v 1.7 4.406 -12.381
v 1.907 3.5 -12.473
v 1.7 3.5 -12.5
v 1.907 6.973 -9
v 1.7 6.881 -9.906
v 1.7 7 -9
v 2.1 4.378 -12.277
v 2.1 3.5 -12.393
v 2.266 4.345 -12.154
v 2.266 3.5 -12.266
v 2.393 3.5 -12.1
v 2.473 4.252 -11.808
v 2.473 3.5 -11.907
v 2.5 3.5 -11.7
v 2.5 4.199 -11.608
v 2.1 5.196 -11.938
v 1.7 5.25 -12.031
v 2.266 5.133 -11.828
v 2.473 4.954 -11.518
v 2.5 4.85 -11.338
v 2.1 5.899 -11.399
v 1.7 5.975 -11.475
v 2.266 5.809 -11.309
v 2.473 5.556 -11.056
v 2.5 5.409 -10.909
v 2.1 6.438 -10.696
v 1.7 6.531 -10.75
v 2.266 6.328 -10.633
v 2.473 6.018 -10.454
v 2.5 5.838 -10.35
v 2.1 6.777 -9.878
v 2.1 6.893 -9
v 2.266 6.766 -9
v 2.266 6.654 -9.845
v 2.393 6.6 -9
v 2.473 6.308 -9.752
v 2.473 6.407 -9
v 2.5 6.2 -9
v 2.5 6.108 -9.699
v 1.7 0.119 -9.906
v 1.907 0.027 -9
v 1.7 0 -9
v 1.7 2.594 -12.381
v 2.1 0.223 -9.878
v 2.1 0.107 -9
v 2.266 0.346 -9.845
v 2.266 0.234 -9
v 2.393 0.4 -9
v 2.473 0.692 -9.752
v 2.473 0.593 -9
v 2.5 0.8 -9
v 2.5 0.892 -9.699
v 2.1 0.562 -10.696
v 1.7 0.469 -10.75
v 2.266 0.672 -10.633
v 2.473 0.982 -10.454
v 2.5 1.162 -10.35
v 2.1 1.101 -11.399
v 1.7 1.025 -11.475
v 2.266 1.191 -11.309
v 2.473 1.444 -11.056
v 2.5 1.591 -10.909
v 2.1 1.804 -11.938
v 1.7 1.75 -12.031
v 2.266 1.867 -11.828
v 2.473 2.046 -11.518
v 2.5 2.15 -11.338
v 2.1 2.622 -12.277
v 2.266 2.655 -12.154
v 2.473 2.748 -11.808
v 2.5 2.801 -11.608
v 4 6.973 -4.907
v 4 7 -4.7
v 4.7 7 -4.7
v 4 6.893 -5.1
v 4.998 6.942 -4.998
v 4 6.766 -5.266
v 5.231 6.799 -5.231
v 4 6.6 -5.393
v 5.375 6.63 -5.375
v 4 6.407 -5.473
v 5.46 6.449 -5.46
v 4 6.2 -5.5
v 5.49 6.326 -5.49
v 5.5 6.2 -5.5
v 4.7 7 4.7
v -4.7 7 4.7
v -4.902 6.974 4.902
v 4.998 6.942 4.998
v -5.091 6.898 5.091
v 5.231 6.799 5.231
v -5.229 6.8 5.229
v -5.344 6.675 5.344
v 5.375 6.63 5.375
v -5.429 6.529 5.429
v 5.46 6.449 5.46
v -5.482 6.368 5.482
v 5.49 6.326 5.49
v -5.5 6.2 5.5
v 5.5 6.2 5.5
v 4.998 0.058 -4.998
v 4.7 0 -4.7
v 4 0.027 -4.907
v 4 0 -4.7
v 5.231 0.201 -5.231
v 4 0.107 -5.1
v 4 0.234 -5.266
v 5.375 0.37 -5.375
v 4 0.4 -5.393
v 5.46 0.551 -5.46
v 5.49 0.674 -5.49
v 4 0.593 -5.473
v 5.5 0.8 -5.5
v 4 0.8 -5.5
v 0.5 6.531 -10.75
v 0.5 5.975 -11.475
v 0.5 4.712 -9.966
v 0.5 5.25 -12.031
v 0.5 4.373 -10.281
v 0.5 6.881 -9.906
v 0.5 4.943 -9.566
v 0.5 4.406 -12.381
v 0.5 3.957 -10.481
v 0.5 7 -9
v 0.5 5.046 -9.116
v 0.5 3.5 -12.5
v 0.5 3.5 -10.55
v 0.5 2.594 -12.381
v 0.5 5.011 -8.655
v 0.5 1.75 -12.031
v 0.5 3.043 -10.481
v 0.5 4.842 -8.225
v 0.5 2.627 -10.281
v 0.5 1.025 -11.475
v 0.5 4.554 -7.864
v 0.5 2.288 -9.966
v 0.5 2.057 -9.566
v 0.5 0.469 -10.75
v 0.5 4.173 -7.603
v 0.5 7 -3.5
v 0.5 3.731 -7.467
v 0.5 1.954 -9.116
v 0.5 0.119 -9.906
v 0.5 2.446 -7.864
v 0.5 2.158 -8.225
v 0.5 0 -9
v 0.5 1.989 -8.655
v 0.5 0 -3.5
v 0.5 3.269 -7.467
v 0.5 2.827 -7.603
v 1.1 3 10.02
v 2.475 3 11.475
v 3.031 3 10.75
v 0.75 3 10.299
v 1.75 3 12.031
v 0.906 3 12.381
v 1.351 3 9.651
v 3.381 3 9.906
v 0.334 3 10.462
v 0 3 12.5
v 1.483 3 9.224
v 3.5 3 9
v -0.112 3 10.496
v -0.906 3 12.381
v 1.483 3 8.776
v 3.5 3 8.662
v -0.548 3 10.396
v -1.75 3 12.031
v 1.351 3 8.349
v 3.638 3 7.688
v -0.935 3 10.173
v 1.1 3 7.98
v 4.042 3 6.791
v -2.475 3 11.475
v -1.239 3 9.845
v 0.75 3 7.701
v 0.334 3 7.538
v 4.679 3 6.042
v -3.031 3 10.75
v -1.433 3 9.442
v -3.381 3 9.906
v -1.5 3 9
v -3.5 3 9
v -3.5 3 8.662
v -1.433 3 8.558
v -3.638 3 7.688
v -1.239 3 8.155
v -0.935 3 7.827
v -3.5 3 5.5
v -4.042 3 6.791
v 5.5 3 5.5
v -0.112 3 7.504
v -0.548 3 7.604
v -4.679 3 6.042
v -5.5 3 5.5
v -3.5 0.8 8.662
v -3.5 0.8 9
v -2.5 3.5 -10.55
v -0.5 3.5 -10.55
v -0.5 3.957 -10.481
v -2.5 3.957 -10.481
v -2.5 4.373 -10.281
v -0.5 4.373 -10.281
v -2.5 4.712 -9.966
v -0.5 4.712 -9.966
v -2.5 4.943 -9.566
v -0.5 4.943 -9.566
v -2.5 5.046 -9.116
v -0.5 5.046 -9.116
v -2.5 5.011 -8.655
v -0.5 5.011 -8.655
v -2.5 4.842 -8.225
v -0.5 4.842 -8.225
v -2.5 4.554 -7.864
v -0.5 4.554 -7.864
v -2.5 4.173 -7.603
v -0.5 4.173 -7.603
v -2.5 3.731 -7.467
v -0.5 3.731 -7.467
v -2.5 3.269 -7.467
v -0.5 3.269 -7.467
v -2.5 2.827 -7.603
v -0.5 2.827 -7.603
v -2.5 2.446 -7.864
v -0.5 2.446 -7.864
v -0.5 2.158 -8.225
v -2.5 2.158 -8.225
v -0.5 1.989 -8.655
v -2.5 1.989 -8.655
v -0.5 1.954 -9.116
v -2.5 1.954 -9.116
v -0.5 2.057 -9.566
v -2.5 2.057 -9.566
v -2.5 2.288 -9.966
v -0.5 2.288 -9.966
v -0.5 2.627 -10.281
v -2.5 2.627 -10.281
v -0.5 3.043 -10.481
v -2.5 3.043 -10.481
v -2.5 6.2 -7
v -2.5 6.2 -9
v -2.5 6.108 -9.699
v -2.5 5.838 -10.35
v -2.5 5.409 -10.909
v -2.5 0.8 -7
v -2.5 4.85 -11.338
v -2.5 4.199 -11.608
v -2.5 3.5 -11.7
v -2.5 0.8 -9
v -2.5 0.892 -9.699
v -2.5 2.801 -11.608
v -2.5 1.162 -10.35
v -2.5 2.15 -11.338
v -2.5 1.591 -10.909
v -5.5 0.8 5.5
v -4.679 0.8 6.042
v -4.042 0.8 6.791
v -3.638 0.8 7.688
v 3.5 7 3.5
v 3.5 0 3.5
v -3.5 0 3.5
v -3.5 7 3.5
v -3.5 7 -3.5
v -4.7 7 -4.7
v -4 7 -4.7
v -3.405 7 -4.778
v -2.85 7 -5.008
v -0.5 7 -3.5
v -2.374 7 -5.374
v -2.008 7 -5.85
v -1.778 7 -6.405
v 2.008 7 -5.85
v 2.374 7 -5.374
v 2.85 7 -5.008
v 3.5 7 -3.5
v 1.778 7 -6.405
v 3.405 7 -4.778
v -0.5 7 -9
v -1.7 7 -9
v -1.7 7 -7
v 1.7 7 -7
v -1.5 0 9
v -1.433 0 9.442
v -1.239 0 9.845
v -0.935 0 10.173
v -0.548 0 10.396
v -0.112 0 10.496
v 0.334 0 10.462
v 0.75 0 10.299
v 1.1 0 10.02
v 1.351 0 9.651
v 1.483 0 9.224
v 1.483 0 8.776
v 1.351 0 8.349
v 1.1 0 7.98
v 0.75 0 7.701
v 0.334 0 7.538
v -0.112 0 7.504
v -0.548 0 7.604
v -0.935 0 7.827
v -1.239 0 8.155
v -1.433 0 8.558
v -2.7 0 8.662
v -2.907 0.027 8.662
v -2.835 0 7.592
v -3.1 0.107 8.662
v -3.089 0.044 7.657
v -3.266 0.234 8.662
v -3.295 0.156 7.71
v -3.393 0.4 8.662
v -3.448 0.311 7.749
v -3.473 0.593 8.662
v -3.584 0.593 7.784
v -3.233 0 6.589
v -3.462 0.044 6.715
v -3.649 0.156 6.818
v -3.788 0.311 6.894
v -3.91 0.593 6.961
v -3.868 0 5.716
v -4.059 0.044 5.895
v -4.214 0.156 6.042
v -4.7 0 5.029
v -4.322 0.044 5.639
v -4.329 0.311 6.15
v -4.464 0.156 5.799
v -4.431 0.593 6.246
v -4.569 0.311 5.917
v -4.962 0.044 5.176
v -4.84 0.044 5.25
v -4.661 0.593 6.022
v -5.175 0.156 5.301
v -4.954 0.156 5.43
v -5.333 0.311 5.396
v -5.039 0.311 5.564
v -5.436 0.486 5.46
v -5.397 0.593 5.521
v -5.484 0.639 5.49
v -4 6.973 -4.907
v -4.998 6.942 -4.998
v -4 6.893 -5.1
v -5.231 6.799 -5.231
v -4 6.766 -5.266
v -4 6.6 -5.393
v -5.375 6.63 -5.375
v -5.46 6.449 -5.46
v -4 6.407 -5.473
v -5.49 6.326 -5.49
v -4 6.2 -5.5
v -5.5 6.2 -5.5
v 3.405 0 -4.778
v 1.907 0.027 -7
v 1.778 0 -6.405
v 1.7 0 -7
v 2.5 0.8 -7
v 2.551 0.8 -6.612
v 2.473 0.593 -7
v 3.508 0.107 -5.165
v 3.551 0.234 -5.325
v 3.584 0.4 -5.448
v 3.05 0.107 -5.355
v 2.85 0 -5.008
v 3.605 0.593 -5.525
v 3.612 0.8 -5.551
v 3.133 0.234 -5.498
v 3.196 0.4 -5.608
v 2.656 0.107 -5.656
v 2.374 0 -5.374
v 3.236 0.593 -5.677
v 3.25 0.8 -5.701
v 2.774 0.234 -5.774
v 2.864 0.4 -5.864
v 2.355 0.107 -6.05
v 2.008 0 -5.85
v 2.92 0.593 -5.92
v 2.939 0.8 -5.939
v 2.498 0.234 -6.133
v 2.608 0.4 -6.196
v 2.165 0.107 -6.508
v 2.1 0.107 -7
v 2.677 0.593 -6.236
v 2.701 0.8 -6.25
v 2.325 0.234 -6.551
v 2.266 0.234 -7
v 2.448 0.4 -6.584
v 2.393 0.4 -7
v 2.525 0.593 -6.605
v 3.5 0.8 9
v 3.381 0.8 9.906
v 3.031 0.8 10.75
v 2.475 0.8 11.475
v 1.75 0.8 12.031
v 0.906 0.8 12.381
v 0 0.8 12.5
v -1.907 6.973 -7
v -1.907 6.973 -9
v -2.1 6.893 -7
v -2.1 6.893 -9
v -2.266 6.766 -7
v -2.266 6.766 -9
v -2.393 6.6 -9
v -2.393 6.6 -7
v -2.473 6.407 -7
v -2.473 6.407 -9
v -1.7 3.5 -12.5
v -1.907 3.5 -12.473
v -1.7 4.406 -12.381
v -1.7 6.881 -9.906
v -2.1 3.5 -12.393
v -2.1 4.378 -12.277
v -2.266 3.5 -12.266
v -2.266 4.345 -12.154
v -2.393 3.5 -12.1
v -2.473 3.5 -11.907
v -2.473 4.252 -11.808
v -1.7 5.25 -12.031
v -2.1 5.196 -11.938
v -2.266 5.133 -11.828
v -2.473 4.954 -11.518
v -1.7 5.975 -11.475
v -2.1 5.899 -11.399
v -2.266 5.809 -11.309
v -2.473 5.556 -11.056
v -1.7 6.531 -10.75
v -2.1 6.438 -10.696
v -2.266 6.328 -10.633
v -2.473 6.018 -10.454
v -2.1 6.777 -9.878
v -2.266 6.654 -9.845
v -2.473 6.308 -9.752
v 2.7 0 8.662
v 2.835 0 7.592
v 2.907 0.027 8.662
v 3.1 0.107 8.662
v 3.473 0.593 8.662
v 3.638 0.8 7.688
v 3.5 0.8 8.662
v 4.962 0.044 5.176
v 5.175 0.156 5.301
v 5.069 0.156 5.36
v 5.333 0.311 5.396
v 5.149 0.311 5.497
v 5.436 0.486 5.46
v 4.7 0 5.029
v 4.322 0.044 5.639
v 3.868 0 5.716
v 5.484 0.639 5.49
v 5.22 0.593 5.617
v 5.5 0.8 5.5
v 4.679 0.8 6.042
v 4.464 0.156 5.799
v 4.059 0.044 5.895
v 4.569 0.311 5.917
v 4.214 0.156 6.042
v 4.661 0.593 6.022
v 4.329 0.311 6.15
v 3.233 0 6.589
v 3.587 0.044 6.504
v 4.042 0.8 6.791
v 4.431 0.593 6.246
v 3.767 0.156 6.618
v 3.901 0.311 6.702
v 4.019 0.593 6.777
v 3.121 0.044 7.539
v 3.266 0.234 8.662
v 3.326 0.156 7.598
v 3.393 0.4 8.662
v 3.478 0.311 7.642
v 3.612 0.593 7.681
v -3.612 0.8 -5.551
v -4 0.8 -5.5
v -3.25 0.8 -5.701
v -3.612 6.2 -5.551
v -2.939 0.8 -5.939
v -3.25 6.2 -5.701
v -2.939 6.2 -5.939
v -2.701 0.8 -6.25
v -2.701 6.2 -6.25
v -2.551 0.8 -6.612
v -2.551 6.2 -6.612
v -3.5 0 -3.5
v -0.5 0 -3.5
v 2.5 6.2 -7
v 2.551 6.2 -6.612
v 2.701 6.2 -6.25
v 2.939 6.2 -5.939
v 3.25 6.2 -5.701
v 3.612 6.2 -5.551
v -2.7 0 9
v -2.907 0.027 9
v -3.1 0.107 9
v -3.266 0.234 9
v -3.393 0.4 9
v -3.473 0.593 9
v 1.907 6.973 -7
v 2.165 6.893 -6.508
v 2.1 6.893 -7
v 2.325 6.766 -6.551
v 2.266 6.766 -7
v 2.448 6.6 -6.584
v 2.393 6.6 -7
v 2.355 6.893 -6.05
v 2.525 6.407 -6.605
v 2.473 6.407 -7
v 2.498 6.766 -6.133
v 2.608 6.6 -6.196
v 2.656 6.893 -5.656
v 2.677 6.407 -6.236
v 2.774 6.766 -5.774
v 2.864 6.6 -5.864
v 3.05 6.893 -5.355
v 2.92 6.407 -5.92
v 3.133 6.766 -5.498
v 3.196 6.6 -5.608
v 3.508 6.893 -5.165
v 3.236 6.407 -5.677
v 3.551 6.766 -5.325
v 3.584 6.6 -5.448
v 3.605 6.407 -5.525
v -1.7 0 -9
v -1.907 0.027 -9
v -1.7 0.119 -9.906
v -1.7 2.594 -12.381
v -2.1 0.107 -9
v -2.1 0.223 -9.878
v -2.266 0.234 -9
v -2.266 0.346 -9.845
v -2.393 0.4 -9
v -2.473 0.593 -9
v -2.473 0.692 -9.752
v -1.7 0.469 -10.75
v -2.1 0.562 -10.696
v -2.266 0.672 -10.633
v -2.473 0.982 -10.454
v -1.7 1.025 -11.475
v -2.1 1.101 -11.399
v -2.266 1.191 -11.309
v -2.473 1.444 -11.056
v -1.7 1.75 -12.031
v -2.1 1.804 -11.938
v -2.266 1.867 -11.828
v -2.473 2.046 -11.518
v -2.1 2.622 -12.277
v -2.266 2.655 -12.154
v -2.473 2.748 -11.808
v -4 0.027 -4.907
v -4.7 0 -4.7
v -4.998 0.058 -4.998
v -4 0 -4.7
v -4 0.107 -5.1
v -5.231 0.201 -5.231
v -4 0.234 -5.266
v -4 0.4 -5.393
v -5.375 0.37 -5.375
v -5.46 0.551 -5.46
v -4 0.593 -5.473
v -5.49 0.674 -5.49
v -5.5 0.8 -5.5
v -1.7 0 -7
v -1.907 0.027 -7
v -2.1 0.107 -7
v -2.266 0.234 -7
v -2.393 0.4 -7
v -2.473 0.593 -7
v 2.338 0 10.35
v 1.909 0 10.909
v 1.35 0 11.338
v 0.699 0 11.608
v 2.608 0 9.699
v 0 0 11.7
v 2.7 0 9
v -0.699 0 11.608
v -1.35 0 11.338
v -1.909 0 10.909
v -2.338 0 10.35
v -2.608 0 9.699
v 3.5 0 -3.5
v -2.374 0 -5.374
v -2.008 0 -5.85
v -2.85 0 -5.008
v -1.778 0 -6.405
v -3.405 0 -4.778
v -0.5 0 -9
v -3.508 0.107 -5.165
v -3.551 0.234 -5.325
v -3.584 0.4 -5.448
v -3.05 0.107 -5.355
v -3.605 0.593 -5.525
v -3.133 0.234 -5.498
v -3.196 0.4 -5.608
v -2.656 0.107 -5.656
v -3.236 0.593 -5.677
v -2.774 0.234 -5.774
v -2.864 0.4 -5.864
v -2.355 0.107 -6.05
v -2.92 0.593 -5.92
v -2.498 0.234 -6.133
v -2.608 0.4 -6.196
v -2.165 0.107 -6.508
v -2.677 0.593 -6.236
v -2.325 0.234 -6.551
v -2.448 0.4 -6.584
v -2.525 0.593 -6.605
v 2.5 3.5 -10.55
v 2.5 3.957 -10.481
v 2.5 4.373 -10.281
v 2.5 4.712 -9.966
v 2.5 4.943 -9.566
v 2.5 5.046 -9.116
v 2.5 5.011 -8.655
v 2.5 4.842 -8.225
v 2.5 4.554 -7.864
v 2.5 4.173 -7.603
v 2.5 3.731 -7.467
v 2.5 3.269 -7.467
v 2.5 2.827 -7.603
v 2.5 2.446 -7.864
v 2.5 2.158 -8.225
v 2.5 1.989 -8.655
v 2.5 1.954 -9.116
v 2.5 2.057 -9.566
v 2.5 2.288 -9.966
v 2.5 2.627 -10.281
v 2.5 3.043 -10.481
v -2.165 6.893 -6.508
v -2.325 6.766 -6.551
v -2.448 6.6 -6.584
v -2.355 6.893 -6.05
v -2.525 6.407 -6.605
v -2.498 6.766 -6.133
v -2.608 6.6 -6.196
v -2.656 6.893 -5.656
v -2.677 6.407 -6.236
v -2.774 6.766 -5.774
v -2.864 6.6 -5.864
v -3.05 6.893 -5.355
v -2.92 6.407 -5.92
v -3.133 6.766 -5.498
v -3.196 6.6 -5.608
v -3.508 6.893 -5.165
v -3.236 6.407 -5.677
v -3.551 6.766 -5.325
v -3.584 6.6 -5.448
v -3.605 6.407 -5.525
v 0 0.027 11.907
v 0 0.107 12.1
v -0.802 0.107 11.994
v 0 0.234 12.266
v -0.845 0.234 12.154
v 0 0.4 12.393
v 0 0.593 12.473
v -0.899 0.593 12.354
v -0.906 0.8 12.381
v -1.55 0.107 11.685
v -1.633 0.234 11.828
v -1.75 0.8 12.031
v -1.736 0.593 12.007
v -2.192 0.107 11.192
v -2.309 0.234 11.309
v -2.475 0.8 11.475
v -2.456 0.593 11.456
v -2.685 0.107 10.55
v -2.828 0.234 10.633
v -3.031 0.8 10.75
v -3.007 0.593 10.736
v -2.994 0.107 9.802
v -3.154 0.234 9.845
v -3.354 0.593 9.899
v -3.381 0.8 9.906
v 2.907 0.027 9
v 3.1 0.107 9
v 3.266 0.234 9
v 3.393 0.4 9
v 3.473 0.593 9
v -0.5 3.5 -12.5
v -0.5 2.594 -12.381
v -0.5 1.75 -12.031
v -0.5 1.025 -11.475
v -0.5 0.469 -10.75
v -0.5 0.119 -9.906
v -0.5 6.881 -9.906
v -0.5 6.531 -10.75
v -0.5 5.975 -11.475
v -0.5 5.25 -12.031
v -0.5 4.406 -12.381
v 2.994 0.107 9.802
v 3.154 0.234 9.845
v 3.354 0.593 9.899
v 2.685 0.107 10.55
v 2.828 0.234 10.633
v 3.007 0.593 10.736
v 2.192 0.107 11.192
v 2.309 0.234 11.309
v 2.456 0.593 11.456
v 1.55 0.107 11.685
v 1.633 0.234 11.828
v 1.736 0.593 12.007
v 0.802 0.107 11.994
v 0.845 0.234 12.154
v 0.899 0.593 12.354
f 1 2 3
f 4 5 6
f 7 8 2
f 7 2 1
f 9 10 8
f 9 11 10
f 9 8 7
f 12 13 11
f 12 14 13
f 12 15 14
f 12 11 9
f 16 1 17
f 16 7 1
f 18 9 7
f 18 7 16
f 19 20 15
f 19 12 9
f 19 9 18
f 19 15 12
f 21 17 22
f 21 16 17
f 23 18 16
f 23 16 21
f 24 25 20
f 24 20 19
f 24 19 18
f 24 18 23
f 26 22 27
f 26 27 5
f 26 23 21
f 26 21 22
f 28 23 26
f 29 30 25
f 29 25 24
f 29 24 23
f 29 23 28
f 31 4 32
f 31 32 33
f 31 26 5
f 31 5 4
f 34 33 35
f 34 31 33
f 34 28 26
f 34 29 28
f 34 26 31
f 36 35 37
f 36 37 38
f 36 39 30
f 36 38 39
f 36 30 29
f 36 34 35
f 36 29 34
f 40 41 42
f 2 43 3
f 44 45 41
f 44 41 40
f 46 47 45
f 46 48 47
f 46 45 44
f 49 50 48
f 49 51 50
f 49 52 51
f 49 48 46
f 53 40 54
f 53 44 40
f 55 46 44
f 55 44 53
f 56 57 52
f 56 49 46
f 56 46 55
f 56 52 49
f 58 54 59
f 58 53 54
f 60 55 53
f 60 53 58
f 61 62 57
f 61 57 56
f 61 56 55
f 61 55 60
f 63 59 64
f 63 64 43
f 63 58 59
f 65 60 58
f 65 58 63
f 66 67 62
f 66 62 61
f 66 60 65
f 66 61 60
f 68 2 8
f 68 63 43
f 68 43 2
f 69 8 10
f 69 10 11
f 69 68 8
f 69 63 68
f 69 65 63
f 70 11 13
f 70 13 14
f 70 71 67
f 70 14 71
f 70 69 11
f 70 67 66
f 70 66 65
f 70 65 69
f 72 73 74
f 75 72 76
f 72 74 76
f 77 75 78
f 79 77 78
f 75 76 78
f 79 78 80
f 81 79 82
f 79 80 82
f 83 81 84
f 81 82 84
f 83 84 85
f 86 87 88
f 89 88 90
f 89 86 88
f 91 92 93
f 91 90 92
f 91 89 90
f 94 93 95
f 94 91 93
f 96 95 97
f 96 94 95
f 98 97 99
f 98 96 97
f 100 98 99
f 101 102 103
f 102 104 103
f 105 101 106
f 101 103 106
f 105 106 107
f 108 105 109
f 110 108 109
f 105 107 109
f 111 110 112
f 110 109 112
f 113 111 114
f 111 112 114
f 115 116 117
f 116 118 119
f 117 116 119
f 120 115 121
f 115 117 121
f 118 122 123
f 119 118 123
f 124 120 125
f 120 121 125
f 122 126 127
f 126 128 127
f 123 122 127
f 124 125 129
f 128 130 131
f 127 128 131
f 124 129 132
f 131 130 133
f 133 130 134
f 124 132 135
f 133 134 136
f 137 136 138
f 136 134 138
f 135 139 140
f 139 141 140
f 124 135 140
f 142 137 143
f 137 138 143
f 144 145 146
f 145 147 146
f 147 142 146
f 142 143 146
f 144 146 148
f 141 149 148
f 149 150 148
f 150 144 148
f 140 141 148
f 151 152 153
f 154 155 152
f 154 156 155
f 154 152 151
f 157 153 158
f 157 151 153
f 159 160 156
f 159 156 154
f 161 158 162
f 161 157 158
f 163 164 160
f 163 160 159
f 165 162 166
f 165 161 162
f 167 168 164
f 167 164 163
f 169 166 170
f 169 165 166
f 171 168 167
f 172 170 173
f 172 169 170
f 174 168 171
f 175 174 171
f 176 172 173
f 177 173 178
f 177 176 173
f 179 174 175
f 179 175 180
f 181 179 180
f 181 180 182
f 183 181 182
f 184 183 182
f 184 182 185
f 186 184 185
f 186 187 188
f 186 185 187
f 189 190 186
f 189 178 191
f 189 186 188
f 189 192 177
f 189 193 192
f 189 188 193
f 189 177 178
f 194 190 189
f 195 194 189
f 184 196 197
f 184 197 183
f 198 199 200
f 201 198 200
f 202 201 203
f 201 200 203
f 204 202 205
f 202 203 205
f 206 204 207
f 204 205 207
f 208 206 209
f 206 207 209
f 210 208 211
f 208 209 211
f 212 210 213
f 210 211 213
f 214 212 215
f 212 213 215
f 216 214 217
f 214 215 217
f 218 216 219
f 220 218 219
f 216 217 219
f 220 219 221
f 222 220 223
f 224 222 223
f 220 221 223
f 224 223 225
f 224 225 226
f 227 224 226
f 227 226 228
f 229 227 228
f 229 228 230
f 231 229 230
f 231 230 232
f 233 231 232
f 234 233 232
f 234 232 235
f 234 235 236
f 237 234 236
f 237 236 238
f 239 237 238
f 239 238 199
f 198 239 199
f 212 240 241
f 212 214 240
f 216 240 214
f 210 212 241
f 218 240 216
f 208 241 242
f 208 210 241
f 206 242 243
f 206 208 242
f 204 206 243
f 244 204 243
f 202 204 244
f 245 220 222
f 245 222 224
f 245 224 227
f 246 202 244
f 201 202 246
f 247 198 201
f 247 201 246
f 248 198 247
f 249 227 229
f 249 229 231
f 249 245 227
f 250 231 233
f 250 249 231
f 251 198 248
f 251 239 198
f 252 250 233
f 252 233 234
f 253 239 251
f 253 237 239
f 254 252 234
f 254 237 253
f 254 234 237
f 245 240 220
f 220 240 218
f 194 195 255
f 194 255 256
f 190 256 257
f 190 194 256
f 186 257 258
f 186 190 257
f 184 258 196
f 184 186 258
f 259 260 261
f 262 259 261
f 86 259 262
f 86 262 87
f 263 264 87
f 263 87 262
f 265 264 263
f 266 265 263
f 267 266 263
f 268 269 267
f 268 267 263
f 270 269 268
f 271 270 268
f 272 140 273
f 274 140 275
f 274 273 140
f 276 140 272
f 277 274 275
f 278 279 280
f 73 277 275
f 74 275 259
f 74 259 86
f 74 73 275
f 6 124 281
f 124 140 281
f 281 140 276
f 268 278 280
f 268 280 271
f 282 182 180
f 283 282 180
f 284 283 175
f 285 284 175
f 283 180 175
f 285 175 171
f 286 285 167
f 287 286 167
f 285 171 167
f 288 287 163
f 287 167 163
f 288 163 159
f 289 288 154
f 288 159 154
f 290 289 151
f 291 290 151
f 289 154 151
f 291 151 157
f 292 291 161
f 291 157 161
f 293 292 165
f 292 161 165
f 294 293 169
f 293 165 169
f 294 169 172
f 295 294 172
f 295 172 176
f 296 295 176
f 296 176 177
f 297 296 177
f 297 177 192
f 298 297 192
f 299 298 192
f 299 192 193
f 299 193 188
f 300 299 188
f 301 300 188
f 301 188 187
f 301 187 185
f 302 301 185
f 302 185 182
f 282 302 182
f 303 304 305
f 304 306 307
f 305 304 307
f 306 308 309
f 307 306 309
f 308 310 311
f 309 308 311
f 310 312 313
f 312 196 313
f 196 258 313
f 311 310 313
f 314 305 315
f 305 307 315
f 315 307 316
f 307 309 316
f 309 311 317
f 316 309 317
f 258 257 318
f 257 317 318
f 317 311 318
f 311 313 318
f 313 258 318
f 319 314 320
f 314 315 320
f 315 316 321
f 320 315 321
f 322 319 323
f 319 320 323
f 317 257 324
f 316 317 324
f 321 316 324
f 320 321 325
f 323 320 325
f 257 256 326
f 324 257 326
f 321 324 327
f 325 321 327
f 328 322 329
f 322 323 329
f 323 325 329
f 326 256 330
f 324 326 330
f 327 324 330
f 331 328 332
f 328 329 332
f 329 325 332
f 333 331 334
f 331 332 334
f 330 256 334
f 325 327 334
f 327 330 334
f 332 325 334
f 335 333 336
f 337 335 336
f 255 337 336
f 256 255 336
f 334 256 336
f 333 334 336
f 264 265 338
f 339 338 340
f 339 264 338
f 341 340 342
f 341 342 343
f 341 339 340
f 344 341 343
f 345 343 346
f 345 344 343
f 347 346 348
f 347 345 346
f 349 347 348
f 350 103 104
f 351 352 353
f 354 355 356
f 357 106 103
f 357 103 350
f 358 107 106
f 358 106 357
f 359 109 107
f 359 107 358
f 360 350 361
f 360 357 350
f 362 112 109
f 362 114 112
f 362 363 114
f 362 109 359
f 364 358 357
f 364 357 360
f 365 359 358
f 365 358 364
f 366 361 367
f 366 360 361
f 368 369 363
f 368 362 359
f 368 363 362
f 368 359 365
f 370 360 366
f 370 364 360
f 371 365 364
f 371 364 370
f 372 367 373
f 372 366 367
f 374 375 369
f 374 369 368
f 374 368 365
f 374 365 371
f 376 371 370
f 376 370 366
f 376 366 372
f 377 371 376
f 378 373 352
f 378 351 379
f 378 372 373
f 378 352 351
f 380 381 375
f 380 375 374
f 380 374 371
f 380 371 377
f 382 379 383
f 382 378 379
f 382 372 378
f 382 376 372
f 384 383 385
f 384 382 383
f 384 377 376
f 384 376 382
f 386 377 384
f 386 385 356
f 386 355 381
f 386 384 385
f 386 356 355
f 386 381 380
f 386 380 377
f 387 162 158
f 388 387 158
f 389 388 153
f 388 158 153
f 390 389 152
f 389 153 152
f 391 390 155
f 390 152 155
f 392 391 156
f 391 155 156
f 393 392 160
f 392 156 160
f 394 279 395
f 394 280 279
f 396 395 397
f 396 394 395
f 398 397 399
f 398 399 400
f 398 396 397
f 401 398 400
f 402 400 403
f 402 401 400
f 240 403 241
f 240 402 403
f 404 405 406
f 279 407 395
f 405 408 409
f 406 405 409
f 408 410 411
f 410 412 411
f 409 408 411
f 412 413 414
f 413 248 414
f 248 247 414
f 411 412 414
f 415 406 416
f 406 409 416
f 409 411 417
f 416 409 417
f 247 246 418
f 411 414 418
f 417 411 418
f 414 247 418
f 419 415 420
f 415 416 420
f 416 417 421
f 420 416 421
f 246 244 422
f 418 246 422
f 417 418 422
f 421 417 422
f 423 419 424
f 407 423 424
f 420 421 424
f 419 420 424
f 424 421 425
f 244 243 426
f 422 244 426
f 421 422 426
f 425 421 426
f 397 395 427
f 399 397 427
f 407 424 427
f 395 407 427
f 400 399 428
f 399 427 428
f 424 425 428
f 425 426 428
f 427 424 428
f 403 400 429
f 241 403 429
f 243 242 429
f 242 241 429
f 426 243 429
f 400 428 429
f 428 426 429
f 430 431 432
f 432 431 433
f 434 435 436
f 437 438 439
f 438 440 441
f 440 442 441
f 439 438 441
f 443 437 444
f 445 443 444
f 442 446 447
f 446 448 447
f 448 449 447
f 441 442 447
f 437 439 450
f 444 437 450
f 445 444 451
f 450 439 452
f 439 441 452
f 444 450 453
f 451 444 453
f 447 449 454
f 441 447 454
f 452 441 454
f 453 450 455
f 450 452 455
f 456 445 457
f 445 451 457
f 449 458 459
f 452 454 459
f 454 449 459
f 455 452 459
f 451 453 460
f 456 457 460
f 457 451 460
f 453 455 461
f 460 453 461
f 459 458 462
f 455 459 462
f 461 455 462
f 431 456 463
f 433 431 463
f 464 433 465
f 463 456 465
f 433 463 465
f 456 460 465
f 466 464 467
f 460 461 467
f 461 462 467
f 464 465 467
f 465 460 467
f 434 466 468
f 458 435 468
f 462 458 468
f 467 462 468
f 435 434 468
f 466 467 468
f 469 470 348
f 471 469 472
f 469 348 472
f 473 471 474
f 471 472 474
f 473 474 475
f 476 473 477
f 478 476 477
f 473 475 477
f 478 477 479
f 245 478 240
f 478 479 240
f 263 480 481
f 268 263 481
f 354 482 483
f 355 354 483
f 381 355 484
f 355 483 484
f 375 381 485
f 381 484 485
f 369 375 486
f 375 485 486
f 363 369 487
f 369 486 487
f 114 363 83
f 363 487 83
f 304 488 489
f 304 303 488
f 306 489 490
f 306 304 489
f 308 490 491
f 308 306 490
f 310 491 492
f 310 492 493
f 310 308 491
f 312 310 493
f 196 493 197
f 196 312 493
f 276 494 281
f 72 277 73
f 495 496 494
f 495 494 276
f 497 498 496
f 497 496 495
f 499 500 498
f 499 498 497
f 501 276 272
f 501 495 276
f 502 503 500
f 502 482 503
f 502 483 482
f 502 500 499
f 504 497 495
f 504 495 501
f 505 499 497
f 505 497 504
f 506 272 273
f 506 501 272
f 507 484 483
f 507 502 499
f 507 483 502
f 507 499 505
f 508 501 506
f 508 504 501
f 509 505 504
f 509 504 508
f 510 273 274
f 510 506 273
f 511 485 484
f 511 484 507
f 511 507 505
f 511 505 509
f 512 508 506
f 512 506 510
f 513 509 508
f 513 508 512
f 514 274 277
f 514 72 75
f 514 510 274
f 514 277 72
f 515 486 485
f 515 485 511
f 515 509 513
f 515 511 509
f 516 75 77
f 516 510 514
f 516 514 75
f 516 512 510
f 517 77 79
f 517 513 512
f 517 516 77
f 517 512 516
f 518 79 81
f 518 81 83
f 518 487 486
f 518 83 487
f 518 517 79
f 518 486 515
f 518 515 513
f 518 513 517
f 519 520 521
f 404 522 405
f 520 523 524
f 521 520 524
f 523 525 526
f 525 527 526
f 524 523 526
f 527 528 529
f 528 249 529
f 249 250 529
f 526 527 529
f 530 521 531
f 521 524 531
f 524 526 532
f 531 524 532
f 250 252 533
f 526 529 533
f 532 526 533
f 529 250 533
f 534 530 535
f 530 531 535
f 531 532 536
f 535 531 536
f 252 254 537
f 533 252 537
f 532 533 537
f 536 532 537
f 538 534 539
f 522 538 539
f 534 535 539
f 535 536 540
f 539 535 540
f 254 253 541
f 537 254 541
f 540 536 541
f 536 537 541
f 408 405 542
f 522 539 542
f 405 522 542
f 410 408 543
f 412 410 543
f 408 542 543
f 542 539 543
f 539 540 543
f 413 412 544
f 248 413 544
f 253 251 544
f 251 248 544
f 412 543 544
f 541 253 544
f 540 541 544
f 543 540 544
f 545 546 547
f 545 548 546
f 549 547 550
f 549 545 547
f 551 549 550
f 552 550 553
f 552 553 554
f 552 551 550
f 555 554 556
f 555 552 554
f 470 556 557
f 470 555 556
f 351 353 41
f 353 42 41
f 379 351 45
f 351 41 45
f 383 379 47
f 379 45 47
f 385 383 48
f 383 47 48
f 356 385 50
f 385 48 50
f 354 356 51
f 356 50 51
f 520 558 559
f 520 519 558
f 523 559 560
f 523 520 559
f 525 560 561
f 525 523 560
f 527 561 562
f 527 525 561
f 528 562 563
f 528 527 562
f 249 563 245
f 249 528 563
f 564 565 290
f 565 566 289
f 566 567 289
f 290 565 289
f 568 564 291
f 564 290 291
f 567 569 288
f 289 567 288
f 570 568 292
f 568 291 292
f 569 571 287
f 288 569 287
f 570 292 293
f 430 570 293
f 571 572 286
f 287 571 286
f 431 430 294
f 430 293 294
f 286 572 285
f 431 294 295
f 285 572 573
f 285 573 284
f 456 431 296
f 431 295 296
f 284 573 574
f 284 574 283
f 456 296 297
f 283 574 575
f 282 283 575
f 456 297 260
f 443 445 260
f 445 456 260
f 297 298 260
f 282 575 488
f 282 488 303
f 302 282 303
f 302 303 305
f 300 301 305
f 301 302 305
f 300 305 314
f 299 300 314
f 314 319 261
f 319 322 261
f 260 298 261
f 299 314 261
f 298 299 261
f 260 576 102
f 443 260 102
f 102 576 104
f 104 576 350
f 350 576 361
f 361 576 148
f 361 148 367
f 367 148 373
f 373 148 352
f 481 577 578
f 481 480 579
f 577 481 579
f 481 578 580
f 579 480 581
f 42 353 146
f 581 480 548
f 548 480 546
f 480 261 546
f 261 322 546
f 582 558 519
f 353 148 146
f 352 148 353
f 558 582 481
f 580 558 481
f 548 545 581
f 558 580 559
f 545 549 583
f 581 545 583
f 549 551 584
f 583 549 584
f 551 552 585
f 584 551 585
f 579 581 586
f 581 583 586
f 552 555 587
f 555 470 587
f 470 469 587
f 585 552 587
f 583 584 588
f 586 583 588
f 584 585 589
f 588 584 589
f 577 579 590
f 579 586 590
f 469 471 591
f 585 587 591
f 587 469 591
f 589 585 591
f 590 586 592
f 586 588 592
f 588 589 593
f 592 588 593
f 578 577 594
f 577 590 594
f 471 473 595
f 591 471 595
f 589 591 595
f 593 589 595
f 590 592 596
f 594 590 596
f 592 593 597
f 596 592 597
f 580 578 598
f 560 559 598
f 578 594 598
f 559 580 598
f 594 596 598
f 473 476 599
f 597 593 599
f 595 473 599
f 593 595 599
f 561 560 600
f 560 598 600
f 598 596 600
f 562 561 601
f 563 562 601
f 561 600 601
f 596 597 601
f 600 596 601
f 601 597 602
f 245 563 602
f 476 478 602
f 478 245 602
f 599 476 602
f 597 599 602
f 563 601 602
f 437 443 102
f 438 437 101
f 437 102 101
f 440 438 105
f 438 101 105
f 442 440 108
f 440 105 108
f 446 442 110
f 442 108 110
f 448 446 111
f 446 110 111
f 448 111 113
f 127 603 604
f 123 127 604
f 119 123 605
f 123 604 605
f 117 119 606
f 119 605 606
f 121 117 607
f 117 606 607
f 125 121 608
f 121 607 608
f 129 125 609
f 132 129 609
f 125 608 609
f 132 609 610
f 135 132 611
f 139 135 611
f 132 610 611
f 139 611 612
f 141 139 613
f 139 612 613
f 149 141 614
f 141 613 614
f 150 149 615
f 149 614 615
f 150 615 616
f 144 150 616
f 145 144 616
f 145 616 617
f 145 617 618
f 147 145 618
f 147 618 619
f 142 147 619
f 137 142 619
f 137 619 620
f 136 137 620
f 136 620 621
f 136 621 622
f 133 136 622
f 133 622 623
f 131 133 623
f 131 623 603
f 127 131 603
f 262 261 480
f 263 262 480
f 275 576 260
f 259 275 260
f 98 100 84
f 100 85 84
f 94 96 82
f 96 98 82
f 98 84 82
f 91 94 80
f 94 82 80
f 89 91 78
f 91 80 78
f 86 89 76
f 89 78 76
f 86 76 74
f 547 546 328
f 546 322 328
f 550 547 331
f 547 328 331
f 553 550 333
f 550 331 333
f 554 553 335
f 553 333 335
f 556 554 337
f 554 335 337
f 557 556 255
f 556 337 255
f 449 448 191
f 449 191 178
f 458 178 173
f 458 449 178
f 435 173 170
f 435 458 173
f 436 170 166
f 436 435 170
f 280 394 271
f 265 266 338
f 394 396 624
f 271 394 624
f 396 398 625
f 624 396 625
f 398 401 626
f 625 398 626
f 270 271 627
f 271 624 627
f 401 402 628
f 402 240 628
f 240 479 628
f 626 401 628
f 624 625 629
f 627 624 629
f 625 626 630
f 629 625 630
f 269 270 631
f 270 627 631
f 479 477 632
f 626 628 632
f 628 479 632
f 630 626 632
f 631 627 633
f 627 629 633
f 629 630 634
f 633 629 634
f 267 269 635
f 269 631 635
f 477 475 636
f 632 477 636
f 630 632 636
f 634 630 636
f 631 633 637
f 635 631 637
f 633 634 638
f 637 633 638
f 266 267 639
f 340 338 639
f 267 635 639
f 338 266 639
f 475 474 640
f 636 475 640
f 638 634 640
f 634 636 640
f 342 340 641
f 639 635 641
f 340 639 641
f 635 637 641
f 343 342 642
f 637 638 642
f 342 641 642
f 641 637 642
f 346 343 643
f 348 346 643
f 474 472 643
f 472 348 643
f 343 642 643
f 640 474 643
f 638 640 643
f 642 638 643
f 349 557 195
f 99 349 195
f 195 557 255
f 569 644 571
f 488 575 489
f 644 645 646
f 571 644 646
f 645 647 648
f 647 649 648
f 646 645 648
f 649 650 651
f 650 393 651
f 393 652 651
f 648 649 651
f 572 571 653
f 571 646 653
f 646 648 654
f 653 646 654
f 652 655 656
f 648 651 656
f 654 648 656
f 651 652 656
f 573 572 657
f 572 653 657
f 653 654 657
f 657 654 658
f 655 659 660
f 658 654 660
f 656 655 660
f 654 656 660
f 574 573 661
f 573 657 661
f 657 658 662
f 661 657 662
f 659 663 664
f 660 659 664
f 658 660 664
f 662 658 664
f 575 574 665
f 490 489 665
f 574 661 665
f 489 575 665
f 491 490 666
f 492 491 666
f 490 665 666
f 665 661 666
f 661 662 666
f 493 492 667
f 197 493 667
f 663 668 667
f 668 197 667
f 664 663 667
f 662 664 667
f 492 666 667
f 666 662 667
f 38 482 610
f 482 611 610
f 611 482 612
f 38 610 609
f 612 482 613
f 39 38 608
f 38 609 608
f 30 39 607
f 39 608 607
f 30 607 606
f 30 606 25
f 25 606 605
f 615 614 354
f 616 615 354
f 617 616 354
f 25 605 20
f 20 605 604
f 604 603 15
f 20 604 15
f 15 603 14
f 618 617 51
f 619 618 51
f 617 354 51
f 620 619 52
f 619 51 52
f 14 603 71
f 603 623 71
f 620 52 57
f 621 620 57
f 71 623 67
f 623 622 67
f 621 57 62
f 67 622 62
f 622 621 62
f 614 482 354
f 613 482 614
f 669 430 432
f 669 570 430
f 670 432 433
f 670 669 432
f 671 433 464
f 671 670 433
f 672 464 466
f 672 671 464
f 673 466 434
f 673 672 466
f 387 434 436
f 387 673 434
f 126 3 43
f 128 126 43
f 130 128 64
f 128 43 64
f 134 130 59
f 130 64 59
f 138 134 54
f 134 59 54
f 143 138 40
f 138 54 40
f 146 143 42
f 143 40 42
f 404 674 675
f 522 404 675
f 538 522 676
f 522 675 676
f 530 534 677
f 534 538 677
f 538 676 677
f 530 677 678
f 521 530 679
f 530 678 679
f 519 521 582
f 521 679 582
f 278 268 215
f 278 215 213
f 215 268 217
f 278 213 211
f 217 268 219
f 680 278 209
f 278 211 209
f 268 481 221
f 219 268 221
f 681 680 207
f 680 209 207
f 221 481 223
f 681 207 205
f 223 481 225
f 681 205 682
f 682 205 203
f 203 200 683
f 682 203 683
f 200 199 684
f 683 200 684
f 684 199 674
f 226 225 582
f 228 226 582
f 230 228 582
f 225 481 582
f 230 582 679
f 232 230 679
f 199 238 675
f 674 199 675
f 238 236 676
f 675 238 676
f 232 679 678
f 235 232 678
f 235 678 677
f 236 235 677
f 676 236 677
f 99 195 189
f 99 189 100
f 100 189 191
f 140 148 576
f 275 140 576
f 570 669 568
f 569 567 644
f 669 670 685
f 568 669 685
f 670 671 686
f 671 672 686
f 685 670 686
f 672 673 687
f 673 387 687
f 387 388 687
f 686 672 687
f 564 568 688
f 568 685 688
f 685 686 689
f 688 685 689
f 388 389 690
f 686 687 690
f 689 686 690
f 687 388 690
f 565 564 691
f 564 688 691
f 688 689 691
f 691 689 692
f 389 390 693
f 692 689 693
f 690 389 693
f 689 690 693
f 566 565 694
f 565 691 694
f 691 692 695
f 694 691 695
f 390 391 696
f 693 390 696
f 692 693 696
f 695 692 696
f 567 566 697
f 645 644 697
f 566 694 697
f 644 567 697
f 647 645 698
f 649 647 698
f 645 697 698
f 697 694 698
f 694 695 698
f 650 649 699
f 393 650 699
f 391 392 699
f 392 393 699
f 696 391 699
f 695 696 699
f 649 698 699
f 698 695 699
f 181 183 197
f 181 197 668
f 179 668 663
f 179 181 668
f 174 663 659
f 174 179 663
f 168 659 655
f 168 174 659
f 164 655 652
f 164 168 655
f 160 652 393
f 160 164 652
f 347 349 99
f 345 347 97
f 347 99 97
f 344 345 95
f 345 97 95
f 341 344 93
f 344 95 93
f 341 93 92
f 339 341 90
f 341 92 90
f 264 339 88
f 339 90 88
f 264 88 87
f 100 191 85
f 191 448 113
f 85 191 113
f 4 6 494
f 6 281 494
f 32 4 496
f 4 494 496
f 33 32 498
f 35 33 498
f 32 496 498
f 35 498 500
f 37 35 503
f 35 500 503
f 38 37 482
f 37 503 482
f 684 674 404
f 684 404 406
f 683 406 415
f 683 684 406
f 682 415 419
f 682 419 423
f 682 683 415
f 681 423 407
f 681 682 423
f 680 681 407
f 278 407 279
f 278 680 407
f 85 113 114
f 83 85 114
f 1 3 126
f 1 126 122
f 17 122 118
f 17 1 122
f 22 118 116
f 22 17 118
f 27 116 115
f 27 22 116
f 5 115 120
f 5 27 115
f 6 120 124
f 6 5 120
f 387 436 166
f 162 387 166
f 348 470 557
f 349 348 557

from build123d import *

# Parameters (mm, degrees)
SKETCH_1_W          = 2
SKETCH_1_H          = 7
EXTRUDE_2_DEPTH     = 7
FILLET_1_R          = 3.5
SKETCH_2_R          = 1.55
CUT_EXTRUDE_1_DEPTH = 17.408839081
SKETCH_3_W          = 3.5
SKETCH_3_H          = 3
EXTRUDE_4_DEPTH     = 7
FILLET_2_R          = 3.5
SKETCH_4_R          = 1.5
CUT_EXTRUDE_2_DEPTH = 15.230249471
FILLET_3_R          = 3.5
FILLET_4_R          = 1.5
FILLET_5_R          = 0.8


# Some blends are built 0.0001 mm under size
with BuildPart() as part:
    # 草图1 → 凸台-拉伸2 (new body)
    with BuildSketch(Plane(origin=(0, 0, 0), x_dir=(1, 0, 0), z_dir=(0, 1, 0))):
        Polygon((-3.5, -3.5), (-3.5, 3.5), (-0.5, 3.5), (-0.5, 5.5), (-2.5, 5.5), (-5.5, 5.5), (-5.5, -5.5), (5.5, -5.5), (5.5, 5.5), (2.5, 5.5), (0.5, 5.5), (0.5, 3.5), (3.5, 3.5), (3.5, -3.5), align=None)
        with Locations((-1.5, 9)):
            Rectangle(SKETCH_1_W, SKETCH_1_H)
        with Locations((1.5, 9)):
            Rectangle(SKETCH_1_W, SKETCH_1_H)
    extrude(amount=EXTRUDE_2_DEPTH)

    # 圆角1
    fillet_1_edges = [part.edges().sort_by_distance(p)[0] for p in [
        (1.5, 7, -12.5),
        (1.5, 0, -12.5),
        (-1.5, 0, -12.5),
        (-1.5, 7, -12.5),
    ]]
    fillet(fillet_1_edges, radius=FILLET_1_R - 0.0001)  # a hair under: the kernel refuses the full size

    # 草图2 → 切除-拉伸1 (cut, through all)
    with BuildSketch(Plane(origin=(2.5, 0, 0), x_dir=(0, 0, -1), z_dir=(1, 0, 0))):
        with Locations((9, 3.5)):
            Circle(SKETCH_2_R)
    extrude(amount=-CUT_EXTRUDE_1_DEPTH, mode=Mode.SUBTRACT)

    # 草图3 → 凸台-拉伸4 (add)
    with BuildSketch(Plane.XY.offset(5.5)):
        with Locations((-1.75, 1.5)):
            Rectangle(SKETCH_3_W, SKETCH_3_H)
        with Locations((1.75, 1.5)):
            Rectangle(SKETCH_3_W, SKETCH_3_H)
    extrude(amount=EXTRUDE_4_DEPTH)

    # 圆角2
    fillet_2_edges = [part.edges().sort_by_distance(p)[0] for p in [
        (3.5, 1.5, 12.5),
        (-3.5, 1.5, 12.5),
    ]]
    fillet(fillet_2_edges, radius=FILLET_2_R - 0.0001)  # a hair under: the kernel refuses the full size

    # 草图4 → 切除-拉伸2 (cut, through all)
    with BuildSketch(Plane(origin=(0, 3, 0), x_dir=(1, 0, 0), z_dir=(0, 1, 0))):
        with Locations(Location((0, -9, 0), (0, 0, 180))):
            Circle(SKETCH_4_R)
    extrude(amount=-CUT_EXTRUDE_2_DEPTH, mode=Mode.SUBTRACT)

    # 圆角3
    # the kernel refuses this fillet: 3.5 mm, written as the material it adds along each edge
    with BuildSketch(Plane(origin=(3.5, 0, 5.5), x_dir=(1, 0, 0), z_dir=(0, 1, 0))) as fillet_3_piece_1:
        with BuildLine():
            CenterArc((3.5, -3.16227766), FILLET_3_R, 115.376933525, 64.623066475)
            Line((0, -3.16227766), (-0.07, -3.16227766))
            Line((-0.07, -3.16227766), (-0.07, 0))
            Line((-0.07, 0), (0, 0.07))
            ThreePointArc((0, 0.07), (1, 0.07), (1.97, 0.063245553))
            Line((1.97, 0.063245553), (2, 0))
        make_face()
    extrude(amount=3)
    with BuildSketch(Plane(origin=(-3.5, 3, 5.5), x_dir=(0, 0, 1), z_dir=(0, -1, 0))) as fillet_3_piece_2:
        with BuildLine():
            CenterArc((3.16227766, 3.5), FILLET_3_R, 205.376933525, 64.623066475)
            Line((0, 2), (-0.063245553, 1.97))
            ThreePointArc((-0.063245553, 1.97), (-0.07, 1), (-0.07, 0))
            Line((-0.07, 0), (0, -0.07))
            Line((0, -0.07), (3.16227766, -0.07))
            Line((3.16227766, -0.07), (3.16227766, 0))
        make_face()
    extrude(amount=3)

    # 圆角4
    fillet_4_edges = [part.edges().sort_by_distance(p)[0] for p in [
        (-2.5, 3.5, -5.5),
        (2.5, 3.5, -5.5),
    ]]
    fillet(fillet_4_edges, radius=FILLET_4_R)

    # 圆角5
    fillet_5_edges = [part.edges().sort_by_distance(p)[0] for p in [
        (4.041960108, 0, 6.791448967),
        (-4.041960108, 0, 6.791448967),
        (4.75, 0, -5.5),
        (4.75, 7, -5.5),
        (-2.939339828, 0, -5.939339828),
        (-2.939339828, 7, -5.939339828),
        (2.939339828, 0, -5.939339828),
        (2.939339828, 7, -5.939339828),
        (5.5, 0, 0),
        (-5.5, 0, 0),
        (-4.75, 0, -5.5),
        (2.5, 0, -8.00005),
        (2.5, 7, -8.00005),
        (2.5, 1.025096977, -11.474903023),
        (2.5, 5.974903023, -11.474903023),
        (-2.5, 7, -8.00005),
        (-2.5, 0, -8.00005),
        (-4.75, 7, -5.5),
        (-2.5, 5.974903023, -11.474903023),
        (-2.5, 1.025096977, -11.474903023),
        (-5.5, 7, 0),
        (0, 7, 5.5),
        (5.5, 7, 0),
        (3.5, 0, 8.83118883),
        (-3.5, 0, 8.83118883),
        (-2.474903023, 0, 11.474903023),
        (2.474903023, 0, 11.474903023),
    ]]
    fillet(fillet_5_edges, radius=FILLET_5_R)


solid = part.part
